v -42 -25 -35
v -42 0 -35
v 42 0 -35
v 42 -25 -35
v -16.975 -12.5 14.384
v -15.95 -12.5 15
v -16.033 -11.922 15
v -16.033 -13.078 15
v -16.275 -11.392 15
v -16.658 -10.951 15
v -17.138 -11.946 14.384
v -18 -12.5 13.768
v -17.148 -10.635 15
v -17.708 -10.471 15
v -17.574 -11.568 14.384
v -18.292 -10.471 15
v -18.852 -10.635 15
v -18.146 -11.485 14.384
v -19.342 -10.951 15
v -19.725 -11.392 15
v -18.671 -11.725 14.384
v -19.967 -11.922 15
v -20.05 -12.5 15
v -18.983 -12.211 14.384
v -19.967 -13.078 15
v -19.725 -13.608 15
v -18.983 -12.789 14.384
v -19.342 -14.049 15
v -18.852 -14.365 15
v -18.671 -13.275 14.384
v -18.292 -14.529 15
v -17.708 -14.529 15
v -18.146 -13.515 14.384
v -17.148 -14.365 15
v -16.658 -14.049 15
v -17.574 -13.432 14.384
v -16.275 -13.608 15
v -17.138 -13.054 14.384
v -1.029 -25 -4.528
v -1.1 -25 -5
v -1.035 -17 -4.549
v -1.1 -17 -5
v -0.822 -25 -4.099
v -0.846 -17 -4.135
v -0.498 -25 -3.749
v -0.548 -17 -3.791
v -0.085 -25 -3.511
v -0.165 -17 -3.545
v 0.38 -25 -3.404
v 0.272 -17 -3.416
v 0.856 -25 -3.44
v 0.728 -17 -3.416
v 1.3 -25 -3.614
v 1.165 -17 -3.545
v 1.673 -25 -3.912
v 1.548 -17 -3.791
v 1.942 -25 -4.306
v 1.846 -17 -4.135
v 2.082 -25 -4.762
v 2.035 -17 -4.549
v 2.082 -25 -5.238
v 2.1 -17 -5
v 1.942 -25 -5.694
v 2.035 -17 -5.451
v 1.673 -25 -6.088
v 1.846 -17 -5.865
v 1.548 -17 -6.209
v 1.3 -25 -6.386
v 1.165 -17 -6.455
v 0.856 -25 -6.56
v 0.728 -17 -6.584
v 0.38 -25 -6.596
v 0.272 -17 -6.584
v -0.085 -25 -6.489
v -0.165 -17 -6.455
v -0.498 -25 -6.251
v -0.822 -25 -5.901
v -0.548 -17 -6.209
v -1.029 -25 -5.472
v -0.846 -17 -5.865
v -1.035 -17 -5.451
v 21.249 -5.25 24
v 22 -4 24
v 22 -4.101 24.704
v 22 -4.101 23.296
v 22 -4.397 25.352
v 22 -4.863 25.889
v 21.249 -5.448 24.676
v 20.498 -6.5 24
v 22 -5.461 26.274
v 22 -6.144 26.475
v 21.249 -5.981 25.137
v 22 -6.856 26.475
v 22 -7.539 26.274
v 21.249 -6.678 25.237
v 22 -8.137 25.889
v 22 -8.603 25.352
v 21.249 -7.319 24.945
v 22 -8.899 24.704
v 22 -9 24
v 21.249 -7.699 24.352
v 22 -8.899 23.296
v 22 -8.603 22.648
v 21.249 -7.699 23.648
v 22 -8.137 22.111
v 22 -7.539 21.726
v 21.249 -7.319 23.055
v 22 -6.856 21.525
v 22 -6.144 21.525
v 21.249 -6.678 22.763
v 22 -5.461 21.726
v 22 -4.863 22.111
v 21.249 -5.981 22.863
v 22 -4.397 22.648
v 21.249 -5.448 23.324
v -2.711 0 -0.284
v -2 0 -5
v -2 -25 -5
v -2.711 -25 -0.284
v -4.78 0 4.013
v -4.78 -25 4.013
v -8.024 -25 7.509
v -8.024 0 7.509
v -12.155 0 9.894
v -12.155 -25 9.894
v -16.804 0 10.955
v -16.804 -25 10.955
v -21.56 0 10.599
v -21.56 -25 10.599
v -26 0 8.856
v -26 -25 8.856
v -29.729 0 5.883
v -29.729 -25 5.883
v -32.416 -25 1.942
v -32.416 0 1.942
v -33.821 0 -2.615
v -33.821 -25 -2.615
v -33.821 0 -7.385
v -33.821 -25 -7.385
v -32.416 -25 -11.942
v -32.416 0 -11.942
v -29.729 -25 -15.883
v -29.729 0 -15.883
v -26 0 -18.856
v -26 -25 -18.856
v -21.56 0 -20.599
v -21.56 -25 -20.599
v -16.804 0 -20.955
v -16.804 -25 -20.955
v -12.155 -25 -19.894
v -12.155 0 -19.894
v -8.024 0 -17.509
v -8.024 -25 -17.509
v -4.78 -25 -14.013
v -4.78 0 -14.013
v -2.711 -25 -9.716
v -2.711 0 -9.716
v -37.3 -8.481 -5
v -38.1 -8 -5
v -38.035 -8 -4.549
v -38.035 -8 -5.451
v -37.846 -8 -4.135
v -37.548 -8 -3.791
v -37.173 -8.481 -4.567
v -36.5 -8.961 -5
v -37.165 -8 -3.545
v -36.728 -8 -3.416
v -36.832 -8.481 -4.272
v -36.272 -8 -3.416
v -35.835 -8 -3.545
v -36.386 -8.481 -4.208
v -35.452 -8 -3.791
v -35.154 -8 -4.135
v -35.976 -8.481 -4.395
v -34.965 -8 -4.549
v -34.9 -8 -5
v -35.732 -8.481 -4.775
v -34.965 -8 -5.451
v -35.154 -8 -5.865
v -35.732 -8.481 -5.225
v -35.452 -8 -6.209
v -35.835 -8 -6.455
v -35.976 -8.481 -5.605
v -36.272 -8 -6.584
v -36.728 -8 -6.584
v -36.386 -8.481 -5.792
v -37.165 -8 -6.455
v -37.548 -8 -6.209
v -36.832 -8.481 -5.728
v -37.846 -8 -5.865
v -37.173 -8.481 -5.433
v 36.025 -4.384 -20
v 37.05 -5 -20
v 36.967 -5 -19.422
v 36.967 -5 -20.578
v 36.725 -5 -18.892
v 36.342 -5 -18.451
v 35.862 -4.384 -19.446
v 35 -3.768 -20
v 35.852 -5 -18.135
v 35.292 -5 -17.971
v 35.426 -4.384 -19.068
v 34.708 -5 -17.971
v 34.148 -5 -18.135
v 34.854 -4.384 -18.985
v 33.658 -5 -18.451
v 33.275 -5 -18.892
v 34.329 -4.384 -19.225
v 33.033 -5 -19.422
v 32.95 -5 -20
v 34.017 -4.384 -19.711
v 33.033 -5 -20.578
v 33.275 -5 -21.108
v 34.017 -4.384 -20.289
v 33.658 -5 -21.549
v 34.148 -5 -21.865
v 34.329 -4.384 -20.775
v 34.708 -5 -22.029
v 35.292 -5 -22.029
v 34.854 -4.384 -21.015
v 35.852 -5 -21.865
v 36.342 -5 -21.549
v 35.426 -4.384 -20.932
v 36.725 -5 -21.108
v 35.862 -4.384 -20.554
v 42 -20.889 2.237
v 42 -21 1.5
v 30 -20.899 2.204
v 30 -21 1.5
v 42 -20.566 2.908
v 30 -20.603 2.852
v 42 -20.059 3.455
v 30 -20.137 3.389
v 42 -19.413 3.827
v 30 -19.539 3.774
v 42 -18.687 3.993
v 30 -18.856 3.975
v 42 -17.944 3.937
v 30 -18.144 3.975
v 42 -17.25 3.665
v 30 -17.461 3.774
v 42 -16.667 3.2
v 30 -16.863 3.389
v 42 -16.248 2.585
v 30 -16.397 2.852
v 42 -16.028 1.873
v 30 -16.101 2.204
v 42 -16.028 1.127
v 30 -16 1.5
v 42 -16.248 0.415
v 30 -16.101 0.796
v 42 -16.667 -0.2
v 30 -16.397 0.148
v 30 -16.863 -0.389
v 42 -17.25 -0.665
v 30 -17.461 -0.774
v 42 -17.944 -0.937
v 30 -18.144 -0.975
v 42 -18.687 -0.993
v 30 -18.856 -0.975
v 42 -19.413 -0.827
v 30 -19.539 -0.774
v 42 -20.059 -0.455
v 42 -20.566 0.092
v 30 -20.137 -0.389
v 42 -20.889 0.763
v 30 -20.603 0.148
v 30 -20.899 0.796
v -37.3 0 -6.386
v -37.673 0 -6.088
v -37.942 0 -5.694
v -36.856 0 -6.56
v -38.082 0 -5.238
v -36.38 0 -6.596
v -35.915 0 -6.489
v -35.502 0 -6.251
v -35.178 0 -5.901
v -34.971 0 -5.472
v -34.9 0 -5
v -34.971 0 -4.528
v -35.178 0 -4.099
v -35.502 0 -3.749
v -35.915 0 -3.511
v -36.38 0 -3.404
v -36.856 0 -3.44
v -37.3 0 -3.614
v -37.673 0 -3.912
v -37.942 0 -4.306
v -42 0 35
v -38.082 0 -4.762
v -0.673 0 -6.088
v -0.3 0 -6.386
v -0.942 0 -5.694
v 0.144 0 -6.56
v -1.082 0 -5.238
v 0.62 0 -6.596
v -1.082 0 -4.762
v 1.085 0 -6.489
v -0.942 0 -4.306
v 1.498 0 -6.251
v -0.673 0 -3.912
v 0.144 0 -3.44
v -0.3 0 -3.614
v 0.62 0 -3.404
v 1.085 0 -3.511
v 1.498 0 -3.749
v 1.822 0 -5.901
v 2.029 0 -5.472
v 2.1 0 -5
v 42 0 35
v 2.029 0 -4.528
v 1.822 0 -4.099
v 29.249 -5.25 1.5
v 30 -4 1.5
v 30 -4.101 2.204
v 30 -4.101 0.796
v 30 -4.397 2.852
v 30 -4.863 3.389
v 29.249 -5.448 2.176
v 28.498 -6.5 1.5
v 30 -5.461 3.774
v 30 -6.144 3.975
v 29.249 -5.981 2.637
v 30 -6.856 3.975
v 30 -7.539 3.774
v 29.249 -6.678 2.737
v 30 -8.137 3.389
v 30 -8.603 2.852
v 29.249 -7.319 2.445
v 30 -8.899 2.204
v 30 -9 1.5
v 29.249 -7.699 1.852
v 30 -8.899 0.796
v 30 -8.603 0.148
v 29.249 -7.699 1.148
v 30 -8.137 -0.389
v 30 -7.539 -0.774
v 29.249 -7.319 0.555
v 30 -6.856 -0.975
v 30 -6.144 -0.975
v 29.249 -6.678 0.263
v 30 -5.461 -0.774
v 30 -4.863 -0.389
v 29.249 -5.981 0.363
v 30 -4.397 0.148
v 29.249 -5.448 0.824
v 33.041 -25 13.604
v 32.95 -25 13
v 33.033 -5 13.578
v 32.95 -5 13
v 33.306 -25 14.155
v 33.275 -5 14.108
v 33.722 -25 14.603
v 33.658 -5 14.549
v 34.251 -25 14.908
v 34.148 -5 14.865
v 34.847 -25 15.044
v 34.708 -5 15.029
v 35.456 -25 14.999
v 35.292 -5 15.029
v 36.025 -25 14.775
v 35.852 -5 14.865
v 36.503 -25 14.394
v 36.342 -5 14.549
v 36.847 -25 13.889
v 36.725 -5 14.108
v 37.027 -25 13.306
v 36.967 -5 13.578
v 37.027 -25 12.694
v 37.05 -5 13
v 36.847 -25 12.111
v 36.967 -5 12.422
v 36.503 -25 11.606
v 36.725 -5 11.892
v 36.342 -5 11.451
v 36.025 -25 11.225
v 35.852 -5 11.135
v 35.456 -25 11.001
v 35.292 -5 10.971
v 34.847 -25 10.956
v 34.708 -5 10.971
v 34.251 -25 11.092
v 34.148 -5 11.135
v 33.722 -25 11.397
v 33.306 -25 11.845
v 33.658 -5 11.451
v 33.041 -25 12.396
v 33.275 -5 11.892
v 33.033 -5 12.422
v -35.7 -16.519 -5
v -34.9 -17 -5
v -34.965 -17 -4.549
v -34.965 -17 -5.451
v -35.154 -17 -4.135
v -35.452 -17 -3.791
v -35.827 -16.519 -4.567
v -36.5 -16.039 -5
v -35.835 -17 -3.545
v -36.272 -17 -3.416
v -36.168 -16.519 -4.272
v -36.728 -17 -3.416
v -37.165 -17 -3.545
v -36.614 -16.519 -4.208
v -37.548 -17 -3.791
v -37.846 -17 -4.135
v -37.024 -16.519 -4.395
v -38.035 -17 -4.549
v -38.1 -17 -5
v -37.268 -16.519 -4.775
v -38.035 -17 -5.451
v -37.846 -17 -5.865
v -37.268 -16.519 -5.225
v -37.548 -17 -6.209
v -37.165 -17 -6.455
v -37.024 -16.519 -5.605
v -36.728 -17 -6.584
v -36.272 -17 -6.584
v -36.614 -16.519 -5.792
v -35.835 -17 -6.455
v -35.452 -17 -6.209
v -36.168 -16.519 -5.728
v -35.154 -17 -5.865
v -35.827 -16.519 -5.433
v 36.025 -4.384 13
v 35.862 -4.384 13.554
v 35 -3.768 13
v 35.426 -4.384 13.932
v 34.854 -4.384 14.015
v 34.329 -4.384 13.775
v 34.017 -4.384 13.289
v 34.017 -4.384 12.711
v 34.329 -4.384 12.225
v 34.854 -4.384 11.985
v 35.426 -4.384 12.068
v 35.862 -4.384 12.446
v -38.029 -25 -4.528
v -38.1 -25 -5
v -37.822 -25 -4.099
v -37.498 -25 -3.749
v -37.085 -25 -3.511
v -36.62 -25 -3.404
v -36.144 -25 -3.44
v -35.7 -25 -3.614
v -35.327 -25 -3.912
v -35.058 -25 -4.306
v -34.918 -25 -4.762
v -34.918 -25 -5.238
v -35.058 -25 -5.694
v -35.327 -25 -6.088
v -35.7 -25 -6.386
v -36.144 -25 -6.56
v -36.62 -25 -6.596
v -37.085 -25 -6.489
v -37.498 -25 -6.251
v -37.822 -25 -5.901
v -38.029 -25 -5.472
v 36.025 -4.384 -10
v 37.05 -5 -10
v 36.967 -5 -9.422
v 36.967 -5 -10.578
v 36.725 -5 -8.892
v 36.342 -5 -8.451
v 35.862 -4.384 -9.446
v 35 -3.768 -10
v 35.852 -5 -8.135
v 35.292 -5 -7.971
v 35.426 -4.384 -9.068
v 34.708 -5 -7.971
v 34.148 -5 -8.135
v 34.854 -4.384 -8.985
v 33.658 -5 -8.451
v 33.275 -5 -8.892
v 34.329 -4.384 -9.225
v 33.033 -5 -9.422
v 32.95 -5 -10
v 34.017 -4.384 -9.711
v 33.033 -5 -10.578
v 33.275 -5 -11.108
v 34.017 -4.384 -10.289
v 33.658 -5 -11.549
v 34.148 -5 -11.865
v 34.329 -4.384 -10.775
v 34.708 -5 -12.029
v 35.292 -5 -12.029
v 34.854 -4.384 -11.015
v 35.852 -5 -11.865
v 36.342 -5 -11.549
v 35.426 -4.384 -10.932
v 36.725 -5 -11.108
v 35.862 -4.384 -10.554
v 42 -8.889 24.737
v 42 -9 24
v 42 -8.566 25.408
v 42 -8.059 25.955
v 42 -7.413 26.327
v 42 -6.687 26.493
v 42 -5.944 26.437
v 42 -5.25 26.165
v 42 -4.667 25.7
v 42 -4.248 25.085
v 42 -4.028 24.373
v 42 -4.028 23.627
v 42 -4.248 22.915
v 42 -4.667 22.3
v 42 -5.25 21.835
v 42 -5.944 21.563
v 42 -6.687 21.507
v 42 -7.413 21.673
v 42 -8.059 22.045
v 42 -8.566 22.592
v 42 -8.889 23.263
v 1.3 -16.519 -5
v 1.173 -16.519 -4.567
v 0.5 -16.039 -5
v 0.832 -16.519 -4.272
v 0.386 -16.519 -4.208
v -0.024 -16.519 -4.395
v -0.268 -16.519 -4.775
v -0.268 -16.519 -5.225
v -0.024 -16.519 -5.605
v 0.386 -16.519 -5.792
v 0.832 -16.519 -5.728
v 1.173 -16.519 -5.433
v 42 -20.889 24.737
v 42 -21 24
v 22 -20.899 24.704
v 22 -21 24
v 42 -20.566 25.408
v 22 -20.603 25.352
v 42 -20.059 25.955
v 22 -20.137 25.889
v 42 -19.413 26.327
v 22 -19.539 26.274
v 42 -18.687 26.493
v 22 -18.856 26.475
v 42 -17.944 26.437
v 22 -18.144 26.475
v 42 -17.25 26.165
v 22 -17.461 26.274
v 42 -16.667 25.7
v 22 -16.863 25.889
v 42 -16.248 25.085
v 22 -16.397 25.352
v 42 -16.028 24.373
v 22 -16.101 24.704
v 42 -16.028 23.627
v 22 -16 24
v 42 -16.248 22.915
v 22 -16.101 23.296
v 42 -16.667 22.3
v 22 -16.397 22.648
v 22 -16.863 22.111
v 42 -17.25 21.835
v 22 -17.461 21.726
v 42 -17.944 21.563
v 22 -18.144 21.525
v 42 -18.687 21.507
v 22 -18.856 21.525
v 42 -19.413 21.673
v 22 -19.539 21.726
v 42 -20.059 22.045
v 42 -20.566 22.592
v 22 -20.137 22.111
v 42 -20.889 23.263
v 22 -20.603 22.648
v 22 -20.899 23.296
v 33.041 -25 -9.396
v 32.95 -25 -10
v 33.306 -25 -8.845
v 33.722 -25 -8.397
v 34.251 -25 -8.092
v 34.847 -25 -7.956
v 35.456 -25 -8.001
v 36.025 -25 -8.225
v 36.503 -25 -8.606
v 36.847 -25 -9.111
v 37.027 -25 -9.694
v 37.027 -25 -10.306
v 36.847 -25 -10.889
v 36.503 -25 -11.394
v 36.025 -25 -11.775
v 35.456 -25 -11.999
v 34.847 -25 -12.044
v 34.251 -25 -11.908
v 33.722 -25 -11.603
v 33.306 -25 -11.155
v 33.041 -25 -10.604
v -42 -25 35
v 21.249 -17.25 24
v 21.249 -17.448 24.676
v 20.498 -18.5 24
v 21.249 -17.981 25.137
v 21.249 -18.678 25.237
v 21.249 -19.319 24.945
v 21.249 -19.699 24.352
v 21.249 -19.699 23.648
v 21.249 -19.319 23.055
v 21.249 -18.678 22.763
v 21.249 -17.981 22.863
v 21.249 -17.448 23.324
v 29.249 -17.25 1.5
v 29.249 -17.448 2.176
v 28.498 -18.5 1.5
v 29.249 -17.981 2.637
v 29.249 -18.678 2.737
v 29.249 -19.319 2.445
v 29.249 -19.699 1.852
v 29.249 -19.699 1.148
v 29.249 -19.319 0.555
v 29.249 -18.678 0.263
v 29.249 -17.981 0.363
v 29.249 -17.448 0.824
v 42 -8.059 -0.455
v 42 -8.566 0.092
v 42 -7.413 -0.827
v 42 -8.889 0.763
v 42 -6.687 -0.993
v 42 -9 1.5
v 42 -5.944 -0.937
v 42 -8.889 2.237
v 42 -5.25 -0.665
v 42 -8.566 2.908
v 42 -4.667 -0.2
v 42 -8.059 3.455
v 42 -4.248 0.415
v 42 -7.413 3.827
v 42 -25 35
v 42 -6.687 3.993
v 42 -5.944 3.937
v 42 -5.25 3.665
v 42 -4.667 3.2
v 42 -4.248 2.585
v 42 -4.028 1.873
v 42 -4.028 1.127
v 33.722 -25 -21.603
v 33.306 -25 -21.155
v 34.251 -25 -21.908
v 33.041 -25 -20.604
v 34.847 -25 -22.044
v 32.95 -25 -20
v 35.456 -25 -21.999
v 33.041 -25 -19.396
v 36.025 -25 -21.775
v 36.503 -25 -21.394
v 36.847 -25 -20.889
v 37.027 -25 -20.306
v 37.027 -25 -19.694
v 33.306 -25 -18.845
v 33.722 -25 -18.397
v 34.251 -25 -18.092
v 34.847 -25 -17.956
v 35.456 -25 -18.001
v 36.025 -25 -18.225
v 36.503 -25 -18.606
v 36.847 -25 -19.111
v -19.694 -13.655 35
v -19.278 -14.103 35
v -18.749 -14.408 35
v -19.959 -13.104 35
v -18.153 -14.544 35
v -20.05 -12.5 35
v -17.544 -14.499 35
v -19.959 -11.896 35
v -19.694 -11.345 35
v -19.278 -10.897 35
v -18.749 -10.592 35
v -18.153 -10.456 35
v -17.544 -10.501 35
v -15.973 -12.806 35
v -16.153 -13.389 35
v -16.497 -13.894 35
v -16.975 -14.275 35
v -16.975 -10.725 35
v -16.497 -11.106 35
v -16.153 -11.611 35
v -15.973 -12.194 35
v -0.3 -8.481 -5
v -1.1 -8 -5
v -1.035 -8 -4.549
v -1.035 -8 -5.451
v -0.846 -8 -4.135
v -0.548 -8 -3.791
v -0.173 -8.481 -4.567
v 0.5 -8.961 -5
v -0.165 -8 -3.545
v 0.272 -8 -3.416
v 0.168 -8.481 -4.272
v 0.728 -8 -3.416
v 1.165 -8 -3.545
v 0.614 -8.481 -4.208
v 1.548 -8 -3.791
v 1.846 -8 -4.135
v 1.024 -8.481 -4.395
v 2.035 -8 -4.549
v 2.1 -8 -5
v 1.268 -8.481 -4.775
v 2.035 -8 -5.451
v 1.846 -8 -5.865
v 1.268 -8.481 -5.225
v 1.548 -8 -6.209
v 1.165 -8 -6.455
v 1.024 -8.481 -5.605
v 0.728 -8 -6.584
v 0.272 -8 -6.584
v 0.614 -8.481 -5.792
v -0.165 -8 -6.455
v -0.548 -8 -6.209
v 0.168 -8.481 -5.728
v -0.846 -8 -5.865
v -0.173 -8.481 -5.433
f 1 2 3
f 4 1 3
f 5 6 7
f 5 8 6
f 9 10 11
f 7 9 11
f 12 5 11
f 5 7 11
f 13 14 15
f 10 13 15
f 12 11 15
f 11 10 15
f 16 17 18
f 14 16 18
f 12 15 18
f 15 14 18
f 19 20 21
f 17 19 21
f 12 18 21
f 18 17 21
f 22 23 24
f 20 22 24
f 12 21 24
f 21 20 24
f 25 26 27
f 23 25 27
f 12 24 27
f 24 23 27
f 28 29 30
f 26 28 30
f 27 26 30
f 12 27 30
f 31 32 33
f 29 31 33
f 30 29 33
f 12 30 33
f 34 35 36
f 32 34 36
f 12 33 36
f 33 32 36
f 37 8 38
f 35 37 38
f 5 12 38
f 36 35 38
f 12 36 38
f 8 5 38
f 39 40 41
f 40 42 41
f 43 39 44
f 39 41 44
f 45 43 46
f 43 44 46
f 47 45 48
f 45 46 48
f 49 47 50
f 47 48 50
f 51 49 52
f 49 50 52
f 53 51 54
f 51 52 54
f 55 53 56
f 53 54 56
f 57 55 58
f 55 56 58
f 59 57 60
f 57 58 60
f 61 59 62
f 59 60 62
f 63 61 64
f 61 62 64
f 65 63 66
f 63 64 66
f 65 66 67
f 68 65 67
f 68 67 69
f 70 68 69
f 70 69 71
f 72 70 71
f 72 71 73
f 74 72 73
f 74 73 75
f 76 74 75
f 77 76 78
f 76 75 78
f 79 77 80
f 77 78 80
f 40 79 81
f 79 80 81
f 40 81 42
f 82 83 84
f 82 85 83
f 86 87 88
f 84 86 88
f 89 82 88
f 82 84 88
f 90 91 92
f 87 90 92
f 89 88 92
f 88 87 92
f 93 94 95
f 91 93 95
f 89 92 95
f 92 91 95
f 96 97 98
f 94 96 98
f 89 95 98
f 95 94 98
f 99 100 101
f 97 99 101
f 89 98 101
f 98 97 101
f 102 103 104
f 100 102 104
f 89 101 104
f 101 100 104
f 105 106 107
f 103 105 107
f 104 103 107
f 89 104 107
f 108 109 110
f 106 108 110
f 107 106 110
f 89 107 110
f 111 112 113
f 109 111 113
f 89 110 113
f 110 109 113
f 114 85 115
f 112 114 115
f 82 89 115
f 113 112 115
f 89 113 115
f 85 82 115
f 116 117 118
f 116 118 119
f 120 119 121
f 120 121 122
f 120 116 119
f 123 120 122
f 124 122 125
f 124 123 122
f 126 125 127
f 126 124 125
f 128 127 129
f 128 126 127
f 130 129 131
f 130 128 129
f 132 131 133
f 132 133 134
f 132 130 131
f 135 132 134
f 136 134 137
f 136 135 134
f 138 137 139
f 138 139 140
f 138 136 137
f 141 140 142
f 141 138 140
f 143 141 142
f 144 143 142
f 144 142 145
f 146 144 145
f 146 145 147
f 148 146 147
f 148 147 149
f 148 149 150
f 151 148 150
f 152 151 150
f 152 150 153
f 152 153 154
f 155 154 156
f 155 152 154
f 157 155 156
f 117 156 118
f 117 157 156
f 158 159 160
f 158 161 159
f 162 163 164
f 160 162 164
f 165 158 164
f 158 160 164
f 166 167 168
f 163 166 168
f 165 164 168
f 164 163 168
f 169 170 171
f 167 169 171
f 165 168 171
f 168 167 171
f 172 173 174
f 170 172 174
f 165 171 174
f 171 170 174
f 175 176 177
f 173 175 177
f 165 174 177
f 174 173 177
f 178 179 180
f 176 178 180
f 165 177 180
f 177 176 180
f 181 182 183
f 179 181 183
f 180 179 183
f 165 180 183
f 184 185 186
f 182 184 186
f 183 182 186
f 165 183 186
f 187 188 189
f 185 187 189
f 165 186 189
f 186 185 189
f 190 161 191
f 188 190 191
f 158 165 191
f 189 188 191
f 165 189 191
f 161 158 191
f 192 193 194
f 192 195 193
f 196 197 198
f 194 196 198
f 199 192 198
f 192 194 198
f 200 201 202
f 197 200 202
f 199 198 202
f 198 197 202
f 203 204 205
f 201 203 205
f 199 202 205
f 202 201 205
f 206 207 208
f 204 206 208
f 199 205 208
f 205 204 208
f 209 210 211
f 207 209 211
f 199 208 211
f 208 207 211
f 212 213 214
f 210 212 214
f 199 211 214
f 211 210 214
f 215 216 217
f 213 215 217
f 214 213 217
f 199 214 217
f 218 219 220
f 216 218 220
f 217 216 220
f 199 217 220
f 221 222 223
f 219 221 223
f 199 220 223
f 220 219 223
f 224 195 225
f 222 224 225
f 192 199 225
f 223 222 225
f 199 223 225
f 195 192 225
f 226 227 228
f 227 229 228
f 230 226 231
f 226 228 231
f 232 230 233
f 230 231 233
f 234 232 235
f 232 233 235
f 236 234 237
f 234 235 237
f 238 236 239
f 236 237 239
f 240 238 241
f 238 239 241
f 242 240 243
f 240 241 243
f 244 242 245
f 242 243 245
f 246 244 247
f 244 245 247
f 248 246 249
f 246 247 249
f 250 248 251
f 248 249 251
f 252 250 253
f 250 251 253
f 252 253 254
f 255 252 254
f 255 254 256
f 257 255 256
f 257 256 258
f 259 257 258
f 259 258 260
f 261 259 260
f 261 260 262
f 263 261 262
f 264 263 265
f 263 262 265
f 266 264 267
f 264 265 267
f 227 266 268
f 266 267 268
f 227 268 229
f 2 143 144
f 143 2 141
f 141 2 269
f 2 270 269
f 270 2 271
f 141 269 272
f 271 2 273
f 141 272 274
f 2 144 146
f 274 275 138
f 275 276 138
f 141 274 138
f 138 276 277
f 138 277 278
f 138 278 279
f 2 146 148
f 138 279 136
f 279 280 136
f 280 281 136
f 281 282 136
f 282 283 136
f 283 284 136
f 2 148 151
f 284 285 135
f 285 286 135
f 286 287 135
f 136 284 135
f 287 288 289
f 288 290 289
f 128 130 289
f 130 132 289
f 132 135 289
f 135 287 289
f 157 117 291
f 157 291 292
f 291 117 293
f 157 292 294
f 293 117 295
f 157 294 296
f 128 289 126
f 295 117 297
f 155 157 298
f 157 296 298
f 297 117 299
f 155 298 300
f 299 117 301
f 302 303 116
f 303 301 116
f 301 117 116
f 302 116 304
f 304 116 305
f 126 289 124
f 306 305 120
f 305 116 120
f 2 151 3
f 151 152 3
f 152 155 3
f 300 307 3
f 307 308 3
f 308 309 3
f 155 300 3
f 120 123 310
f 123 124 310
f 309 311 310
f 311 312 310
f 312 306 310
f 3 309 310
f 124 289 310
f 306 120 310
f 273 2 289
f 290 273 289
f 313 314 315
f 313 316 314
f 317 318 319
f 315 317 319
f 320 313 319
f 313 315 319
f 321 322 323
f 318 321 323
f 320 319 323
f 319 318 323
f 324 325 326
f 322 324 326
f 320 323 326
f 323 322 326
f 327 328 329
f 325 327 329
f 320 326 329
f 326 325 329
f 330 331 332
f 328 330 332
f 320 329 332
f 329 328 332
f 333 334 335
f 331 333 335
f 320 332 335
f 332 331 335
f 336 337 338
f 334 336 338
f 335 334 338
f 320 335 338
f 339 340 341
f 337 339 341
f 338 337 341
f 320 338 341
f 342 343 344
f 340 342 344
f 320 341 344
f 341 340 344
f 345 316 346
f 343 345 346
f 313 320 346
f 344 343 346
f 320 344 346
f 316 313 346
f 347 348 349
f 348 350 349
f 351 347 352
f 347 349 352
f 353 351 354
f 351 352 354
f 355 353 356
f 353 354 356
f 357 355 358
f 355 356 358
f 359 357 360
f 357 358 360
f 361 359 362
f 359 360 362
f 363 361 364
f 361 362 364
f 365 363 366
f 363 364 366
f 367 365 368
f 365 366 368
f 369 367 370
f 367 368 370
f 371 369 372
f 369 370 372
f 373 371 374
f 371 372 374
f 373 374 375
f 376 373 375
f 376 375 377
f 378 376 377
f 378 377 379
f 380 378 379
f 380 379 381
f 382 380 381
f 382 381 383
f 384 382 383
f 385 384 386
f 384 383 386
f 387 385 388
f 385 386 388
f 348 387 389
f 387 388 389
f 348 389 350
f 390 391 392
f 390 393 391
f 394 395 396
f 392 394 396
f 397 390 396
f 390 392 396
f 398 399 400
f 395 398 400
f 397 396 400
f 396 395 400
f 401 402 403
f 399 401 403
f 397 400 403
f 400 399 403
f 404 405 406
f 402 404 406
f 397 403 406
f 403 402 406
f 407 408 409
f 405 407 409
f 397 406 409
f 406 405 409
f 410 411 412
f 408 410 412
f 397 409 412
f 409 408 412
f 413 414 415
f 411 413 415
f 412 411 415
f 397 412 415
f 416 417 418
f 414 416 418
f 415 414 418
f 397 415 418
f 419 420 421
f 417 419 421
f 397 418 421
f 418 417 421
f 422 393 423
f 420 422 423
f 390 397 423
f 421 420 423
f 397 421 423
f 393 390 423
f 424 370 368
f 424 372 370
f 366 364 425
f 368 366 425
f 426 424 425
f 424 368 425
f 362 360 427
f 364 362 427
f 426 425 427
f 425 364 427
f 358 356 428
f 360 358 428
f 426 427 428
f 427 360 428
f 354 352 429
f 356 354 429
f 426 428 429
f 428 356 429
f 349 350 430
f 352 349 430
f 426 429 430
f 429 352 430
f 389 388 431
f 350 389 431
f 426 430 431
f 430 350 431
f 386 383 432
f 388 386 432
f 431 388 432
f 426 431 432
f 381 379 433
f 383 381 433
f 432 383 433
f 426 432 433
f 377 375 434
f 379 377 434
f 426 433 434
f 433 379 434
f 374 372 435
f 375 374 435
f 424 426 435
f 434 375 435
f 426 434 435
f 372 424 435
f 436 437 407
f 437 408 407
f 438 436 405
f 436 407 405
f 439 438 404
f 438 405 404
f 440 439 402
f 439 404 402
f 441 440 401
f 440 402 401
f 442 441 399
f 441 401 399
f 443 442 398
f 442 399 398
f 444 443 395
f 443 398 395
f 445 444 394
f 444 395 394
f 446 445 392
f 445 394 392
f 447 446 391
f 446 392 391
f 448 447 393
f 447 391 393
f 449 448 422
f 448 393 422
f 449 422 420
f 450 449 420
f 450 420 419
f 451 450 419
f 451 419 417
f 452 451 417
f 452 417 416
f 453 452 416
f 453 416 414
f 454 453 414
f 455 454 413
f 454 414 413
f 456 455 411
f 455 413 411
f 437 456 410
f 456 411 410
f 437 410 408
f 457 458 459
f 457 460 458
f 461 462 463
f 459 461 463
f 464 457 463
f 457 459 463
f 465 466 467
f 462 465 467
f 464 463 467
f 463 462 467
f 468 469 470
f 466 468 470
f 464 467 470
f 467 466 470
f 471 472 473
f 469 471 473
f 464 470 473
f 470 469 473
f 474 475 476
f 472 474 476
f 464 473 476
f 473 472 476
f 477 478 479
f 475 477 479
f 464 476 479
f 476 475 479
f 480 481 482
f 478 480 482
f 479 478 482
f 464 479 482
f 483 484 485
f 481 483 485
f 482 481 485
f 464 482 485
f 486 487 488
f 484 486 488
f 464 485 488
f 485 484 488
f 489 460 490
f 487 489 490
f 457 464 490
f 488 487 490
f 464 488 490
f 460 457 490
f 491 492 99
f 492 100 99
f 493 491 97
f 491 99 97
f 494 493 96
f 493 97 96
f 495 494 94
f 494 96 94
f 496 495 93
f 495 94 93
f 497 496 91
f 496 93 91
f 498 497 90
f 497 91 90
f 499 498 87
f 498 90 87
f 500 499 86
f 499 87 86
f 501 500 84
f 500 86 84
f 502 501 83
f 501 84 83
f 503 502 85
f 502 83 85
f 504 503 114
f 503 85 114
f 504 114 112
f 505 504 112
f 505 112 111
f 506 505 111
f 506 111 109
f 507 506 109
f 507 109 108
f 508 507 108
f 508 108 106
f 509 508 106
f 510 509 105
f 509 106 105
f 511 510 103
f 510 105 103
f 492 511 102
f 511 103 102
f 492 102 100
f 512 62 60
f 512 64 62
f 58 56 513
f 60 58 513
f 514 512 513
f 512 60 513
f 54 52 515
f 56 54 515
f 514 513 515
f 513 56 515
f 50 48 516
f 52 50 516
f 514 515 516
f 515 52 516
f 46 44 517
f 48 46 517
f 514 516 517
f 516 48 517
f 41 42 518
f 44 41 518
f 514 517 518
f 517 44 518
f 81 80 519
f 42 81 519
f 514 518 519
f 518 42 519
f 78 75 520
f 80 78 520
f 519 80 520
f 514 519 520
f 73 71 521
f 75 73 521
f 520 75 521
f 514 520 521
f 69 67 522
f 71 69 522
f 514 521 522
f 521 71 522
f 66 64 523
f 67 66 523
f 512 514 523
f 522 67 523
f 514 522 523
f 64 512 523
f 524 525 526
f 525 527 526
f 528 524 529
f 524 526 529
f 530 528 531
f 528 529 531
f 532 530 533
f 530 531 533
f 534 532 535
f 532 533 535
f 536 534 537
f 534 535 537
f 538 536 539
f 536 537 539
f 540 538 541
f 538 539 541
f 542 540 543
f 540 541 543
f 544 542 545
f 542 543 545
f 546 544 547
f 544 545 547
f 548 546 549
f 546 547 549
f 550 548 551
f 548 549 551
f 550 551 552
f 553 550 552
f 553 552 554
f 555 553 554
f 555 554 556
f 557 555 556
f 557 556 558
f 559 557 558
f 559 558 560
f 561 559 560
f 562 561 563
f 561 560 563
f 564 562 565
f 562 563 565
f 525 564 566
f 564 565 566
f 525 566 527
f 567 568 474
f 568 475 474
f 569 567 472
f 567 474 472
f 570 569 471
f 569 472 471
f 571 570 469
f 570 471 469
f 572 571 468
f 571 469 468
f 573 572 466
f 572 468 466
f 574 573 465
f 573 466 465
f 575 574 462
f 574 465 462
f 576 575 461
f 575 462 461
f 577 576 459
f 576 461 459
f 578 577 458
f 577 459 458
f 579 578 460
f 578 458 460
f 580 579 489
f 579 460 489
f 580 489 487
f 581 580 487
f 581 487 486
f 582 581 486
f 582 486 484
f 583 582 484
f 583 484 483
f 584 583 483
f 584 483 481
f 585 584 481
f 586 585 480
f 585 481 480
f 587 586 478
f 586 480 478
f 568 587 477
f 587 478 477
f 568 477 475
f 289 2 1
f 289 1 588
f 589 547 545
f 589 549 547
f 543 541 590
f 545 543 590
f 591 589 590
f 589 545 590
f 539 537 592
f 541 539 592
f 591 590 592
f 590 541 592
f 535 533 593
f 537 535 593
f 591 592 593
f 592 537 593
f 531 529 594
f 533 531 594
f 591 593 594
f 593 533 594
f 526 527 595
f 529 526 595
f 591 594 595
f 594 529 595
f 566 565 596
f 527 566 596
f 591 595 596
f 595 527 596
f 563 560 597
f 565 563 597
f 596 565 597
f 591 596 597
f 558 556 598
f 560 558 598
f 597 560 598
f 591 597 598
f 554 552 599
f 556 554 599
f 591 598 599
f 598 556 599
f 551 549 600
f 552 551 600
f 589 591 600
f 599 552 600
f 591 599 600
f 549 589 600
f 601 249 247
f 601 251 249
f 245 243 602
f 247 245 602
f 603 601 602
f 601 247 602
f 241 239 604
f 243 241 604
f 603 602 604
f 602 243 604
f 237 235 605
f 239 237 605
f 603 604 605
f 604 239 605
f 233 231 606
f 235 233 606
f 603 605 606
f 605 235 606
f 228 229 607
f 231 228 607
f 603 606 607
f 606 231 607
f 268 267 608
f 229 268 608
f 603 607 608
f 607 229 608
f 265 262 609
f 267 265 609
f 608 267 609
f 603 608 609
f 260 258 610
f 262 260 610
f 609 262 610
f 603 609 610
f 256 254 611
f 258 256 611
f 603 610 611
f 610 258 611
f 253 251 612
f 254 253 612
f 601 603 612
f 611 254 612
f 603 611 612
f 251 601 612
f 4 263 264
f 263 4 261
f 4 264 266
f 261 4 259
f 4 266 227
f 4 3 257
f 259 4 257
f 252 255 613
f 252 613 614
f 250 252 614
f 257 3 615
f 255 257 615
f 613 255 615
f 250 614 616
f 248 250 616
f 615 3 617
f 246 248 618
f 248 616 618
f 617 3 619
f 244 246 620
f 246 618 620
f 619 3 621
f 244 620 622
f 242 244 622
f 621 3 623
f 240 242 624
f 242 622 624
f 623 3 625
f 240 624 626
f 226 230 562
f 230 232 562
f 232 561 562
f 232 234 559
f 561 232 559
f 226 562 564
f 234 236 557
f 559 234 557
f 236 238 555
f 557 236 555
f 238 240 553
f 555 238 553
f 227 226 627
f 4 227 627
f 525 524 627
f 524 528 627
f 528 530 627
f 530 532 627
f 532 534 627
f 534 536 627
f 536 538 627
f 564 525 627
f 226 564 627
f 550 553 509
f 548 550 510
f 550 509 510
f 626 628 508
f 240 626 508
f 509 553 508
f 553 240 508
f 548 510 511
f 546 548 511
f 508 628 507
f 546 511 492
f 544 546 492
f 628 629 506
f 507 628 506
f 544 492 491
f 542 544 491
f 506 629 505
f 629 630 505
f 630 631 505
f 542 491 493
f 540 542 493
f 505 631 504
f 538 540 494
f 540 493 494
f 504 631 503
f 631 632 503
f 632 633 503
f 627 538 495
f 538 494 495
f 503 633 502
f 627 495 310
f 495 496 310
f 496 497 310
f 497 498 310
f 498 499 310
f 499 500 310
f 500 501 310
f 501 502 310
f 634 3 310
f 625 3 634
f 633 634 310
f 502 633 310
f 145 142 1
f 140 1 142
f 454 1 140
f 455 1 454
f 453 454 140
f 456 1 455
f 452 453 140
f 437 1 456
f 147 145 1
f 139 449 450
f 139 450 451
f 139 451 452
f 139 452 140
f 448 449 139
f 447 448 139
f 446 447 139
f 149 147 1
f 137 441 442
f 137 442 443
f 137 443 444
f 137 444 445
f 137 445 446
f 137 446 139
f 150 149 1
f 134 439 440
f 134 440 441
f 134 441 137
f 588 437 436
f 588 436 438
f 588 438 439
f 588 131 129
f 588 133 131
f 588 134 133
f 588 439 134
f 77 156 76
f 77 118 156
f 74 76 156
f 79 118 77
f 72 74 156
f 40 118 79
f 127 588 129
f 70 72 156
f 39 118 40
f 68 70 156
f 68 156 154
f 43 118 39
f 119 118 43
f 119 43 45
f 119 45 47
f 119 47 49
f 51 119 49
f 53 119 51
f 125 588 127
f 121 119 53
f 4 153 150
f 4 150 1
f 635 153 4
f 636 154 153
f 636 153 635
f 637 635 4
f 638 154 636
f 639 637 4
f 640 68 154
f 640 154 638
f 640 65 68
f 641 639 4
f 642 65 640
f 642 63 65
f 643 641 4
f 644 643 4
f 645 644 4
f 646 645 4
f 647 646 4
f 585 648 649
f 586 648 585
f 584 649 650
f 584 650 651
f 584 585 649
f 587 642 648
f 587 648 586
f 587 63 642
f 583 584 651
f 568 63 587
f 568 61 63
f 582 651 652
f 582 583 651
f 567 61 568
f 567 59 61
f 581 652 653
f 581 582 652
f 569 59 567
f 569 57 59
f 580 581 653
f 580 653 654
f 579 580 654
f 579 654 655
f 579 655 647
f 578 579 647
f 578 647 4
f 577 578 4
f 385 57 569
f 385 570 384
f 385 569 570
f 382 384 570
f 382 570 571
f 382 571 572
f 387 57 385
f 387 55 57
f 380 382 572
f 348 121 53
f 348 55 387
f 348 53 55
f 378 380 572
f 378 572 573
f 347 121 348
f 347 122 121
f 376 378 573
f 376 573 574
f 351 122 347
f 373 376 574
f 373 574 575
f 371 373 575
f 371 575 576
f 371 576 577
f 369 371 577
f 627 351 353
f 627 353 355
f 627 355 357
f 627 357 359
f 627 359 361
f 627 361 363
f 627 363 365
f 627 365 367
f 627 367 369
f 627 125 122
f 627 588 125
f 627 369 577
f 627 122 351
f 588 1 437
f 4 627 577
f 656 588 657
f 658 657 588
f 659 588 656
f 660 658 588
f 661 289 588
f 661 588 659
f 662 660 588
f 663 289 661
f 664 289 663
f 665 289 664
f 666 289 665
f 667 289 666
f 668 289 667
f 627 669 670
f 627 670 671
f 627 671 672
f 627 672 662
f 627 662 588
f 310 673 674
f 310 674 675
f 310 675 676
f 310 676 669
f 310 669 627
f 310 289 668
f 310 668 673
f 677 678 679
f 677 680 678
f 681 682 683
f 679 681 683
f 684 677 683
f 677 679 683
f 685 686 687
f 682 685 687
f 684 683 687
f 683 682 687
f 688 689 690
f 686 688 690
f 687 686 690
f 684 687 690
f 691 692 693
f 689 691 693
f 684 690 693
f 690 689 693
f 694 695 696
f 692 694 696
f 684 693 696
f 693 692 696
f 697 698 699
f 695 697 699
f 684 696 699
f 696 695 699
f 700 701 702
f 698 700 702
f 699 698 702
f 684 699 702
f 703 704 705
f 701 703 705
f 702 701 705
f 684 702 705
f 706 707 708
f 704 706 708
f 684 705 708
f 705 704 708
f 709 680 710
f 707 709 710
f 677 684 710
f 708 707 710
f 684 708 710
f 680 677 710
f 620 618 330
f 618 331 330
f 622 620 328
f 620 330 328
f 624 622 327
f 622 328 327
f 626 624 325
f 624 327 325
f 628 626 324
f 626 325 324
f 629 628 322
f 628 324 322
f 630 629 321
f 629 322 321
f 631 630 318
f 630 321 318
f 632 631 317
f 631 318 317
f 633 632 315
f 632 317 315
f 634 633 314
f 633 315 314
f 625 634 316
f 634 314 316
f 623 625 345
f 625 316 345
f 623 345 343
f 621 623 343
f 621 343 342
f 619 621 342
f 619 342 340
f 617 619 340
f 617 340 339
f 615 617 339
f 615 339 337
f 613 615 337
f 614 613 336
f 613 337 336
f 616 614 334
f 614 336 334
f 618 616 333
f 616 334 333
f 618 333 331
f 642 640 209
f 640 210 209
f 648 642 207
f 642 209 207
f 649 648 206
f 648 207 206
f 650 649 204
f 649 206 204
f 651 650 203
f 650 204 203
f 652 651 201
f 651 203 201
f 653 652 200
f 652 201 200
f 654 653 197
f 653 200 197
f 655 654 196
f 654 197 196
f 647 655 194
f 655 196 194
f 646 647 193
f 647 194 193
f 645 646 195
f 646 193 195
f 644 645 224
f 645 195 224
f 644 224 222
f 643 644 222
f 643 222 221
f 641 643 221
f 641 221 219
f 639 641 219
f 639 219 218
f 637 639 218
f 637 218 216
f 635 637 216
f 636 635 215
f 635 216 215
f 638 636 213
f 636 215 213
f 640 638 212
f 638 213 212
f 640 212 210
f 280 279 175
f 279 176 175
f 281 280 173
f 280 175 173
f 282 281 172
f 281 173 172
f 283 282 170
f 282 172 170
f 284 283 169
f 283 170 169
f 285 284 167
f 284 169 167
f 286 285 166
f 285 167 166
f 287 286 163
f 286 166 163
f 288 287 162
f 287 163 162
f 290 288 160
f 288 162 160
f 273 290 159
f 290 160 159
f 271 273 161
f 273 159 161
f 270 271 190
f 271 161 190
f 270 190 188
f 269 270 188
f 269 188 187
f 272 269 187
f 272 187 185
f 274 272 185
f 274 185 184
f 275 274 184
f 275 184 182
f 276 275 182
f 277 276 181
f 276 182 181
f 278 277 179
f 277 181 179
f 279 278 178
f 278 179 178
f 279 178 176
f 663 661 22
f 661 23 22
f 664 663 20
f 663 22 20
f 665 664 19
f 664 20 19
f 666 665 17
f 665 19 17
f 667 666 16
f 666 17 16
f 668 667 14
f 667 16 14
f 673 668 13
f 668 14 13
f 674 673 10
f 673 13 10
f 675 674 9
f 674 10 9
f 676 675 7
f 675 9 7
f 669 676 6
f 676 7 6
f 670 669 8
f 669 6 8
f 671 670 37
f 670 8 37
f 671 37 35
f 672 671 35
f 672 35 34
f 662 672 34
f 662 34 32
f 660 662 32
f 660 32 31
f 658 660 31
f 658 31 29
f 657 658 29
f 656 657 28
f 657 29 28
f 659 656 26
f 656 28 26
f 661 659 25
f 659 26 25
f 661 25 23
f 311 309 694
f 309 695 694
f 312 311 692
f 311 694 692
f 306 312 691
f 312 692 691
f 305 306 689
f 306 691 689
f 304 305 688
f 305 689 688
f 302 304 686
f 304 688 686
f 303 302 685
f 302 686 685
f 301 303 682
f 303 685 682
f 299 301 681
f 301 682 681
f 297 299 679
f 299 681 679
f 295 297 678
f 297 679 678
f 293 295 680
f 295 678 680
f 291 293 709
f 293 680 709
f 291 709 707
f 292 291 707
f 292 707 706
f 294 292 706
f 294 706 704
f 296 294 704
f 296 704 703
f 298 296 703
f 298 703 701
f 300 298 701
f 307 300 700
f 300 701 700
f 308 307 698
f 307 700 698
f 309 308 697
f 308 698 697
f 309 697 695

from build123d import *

# Parameters (mm, degrees)
F0_W      = 84
F0_H      = 70
F0_R      = 16
F1_DEPTH  = 25
F3_D      = 3.2
F3_DEPTH  = 8
F3_TIP    = 0.9613769904
F5_D      = 4.1
F5_DEPTH  = 20
F5_TIP    = 1.231764269
F7_D      = 4.1
F7_DEPTH  = 20
F7_TIP    = 1.231764269
F9_D      = 5
F9_DEPTH  = 20
F9_TIP    = 1.5021515476
F11_D     = 5
F11_DEPTH = 12
F11_TIP   = 1.5021515476
F13_D     = 3.2
F13_DEPTH = 8
F13_TIP   = 0.9613769904


with BuildPart() as f1:
    # F0 (on Front) → F1 (new body)
    with BuildSketch(Plane.XZ):
        Rectangle(F0_W, F0_H)
        with Locations((-18, -5)):
            Circle(F0_R, mode=Mode.SUBTRACT)
    extrude(amount=F1_DEPTH)

    # F3
    with Locations(Plane.XZ.offset(25)):
        with Locations((-36.5, -5), (0.5, -5)):
            Hole(F3_D / 2, depth=F3_DEPTH)
            with Locations((0, 0, -(F3_DEPTH + F3_TIP / 2))):  # 118° drill point
                Cone(0, F3_D / 2, F3_TIP, mode=Mode.SUBTRACT)

    # F5
    with Locations(Plane.XZ.offset(25)):
        with Locations((35, 13), (35, -10), (35, -20)):
            Hole(F5_D / 2, depth=F5_DEPTH)
            with Locations((0, 0, -(F5_DEPTH + F5_TIP / 2))):  # 118° drill point
                Cone(0, F5_D / 2, F5_TIP, mode=Mode.SUBTRACT)

    # F7
    with Locations(Plane.XY.offset(35)):
        with Locations((-18, -12.5)):
            Hole(F7_D / 2, depth=F7_DEPTH)
            with Locations((0, 0, -(F7_DEPTH + F7_TIP / 2))):  # 118° drill point
                Cone(0, F7_D / 2, F7_TIP, mode=Mode.SUBTRACT)

    # F9
    with Locations(Plane.YZ.offset(42)):
        with Locations((-18.5, 24), (-6.5, 24)):
            Hole(F9_D / 2, depth=F9_DEPTH)
            with Locations((0, 0, -(F9_DEPTH + F9_TIP / 2))):  # 118° drill point
                Cone(0, F9_D / 2, F9_TIP, mode=Mode.SUBTRACT)

    # F11
    with Locations(Plane.YZ.offset(42)):
        with Locations((-18.5, 1.5), (-6.5, 1.5)):
            Hole(F11_D / 2, depth=F11_DEPTH)
            with Locations((0, 0, -(F11_DEPTH + F11_TIP / 2))):  # 118° drill point
                Cone(0, F11_D / 2, F11_TIP, mode=Mode.SUBTRACT)

    # F13
    with Locations(Plane(origin=(0, 0, 0), x_dir=(-1, 0, 0), z_dir=(0, 1, 0))):
        with Locations((-0.5, -5), (36.5, -5)):
            Hole(F13_D / 2, depth=F13_DEPTH)
            with Locations((0, 0, -(F13_DEPTH + F13_TIP / 2))):  # 118° drill point
                Cone(0, F13_D / 2, F13_TIP, mode=Mode.SUBTRACT)


solid = f1.part
